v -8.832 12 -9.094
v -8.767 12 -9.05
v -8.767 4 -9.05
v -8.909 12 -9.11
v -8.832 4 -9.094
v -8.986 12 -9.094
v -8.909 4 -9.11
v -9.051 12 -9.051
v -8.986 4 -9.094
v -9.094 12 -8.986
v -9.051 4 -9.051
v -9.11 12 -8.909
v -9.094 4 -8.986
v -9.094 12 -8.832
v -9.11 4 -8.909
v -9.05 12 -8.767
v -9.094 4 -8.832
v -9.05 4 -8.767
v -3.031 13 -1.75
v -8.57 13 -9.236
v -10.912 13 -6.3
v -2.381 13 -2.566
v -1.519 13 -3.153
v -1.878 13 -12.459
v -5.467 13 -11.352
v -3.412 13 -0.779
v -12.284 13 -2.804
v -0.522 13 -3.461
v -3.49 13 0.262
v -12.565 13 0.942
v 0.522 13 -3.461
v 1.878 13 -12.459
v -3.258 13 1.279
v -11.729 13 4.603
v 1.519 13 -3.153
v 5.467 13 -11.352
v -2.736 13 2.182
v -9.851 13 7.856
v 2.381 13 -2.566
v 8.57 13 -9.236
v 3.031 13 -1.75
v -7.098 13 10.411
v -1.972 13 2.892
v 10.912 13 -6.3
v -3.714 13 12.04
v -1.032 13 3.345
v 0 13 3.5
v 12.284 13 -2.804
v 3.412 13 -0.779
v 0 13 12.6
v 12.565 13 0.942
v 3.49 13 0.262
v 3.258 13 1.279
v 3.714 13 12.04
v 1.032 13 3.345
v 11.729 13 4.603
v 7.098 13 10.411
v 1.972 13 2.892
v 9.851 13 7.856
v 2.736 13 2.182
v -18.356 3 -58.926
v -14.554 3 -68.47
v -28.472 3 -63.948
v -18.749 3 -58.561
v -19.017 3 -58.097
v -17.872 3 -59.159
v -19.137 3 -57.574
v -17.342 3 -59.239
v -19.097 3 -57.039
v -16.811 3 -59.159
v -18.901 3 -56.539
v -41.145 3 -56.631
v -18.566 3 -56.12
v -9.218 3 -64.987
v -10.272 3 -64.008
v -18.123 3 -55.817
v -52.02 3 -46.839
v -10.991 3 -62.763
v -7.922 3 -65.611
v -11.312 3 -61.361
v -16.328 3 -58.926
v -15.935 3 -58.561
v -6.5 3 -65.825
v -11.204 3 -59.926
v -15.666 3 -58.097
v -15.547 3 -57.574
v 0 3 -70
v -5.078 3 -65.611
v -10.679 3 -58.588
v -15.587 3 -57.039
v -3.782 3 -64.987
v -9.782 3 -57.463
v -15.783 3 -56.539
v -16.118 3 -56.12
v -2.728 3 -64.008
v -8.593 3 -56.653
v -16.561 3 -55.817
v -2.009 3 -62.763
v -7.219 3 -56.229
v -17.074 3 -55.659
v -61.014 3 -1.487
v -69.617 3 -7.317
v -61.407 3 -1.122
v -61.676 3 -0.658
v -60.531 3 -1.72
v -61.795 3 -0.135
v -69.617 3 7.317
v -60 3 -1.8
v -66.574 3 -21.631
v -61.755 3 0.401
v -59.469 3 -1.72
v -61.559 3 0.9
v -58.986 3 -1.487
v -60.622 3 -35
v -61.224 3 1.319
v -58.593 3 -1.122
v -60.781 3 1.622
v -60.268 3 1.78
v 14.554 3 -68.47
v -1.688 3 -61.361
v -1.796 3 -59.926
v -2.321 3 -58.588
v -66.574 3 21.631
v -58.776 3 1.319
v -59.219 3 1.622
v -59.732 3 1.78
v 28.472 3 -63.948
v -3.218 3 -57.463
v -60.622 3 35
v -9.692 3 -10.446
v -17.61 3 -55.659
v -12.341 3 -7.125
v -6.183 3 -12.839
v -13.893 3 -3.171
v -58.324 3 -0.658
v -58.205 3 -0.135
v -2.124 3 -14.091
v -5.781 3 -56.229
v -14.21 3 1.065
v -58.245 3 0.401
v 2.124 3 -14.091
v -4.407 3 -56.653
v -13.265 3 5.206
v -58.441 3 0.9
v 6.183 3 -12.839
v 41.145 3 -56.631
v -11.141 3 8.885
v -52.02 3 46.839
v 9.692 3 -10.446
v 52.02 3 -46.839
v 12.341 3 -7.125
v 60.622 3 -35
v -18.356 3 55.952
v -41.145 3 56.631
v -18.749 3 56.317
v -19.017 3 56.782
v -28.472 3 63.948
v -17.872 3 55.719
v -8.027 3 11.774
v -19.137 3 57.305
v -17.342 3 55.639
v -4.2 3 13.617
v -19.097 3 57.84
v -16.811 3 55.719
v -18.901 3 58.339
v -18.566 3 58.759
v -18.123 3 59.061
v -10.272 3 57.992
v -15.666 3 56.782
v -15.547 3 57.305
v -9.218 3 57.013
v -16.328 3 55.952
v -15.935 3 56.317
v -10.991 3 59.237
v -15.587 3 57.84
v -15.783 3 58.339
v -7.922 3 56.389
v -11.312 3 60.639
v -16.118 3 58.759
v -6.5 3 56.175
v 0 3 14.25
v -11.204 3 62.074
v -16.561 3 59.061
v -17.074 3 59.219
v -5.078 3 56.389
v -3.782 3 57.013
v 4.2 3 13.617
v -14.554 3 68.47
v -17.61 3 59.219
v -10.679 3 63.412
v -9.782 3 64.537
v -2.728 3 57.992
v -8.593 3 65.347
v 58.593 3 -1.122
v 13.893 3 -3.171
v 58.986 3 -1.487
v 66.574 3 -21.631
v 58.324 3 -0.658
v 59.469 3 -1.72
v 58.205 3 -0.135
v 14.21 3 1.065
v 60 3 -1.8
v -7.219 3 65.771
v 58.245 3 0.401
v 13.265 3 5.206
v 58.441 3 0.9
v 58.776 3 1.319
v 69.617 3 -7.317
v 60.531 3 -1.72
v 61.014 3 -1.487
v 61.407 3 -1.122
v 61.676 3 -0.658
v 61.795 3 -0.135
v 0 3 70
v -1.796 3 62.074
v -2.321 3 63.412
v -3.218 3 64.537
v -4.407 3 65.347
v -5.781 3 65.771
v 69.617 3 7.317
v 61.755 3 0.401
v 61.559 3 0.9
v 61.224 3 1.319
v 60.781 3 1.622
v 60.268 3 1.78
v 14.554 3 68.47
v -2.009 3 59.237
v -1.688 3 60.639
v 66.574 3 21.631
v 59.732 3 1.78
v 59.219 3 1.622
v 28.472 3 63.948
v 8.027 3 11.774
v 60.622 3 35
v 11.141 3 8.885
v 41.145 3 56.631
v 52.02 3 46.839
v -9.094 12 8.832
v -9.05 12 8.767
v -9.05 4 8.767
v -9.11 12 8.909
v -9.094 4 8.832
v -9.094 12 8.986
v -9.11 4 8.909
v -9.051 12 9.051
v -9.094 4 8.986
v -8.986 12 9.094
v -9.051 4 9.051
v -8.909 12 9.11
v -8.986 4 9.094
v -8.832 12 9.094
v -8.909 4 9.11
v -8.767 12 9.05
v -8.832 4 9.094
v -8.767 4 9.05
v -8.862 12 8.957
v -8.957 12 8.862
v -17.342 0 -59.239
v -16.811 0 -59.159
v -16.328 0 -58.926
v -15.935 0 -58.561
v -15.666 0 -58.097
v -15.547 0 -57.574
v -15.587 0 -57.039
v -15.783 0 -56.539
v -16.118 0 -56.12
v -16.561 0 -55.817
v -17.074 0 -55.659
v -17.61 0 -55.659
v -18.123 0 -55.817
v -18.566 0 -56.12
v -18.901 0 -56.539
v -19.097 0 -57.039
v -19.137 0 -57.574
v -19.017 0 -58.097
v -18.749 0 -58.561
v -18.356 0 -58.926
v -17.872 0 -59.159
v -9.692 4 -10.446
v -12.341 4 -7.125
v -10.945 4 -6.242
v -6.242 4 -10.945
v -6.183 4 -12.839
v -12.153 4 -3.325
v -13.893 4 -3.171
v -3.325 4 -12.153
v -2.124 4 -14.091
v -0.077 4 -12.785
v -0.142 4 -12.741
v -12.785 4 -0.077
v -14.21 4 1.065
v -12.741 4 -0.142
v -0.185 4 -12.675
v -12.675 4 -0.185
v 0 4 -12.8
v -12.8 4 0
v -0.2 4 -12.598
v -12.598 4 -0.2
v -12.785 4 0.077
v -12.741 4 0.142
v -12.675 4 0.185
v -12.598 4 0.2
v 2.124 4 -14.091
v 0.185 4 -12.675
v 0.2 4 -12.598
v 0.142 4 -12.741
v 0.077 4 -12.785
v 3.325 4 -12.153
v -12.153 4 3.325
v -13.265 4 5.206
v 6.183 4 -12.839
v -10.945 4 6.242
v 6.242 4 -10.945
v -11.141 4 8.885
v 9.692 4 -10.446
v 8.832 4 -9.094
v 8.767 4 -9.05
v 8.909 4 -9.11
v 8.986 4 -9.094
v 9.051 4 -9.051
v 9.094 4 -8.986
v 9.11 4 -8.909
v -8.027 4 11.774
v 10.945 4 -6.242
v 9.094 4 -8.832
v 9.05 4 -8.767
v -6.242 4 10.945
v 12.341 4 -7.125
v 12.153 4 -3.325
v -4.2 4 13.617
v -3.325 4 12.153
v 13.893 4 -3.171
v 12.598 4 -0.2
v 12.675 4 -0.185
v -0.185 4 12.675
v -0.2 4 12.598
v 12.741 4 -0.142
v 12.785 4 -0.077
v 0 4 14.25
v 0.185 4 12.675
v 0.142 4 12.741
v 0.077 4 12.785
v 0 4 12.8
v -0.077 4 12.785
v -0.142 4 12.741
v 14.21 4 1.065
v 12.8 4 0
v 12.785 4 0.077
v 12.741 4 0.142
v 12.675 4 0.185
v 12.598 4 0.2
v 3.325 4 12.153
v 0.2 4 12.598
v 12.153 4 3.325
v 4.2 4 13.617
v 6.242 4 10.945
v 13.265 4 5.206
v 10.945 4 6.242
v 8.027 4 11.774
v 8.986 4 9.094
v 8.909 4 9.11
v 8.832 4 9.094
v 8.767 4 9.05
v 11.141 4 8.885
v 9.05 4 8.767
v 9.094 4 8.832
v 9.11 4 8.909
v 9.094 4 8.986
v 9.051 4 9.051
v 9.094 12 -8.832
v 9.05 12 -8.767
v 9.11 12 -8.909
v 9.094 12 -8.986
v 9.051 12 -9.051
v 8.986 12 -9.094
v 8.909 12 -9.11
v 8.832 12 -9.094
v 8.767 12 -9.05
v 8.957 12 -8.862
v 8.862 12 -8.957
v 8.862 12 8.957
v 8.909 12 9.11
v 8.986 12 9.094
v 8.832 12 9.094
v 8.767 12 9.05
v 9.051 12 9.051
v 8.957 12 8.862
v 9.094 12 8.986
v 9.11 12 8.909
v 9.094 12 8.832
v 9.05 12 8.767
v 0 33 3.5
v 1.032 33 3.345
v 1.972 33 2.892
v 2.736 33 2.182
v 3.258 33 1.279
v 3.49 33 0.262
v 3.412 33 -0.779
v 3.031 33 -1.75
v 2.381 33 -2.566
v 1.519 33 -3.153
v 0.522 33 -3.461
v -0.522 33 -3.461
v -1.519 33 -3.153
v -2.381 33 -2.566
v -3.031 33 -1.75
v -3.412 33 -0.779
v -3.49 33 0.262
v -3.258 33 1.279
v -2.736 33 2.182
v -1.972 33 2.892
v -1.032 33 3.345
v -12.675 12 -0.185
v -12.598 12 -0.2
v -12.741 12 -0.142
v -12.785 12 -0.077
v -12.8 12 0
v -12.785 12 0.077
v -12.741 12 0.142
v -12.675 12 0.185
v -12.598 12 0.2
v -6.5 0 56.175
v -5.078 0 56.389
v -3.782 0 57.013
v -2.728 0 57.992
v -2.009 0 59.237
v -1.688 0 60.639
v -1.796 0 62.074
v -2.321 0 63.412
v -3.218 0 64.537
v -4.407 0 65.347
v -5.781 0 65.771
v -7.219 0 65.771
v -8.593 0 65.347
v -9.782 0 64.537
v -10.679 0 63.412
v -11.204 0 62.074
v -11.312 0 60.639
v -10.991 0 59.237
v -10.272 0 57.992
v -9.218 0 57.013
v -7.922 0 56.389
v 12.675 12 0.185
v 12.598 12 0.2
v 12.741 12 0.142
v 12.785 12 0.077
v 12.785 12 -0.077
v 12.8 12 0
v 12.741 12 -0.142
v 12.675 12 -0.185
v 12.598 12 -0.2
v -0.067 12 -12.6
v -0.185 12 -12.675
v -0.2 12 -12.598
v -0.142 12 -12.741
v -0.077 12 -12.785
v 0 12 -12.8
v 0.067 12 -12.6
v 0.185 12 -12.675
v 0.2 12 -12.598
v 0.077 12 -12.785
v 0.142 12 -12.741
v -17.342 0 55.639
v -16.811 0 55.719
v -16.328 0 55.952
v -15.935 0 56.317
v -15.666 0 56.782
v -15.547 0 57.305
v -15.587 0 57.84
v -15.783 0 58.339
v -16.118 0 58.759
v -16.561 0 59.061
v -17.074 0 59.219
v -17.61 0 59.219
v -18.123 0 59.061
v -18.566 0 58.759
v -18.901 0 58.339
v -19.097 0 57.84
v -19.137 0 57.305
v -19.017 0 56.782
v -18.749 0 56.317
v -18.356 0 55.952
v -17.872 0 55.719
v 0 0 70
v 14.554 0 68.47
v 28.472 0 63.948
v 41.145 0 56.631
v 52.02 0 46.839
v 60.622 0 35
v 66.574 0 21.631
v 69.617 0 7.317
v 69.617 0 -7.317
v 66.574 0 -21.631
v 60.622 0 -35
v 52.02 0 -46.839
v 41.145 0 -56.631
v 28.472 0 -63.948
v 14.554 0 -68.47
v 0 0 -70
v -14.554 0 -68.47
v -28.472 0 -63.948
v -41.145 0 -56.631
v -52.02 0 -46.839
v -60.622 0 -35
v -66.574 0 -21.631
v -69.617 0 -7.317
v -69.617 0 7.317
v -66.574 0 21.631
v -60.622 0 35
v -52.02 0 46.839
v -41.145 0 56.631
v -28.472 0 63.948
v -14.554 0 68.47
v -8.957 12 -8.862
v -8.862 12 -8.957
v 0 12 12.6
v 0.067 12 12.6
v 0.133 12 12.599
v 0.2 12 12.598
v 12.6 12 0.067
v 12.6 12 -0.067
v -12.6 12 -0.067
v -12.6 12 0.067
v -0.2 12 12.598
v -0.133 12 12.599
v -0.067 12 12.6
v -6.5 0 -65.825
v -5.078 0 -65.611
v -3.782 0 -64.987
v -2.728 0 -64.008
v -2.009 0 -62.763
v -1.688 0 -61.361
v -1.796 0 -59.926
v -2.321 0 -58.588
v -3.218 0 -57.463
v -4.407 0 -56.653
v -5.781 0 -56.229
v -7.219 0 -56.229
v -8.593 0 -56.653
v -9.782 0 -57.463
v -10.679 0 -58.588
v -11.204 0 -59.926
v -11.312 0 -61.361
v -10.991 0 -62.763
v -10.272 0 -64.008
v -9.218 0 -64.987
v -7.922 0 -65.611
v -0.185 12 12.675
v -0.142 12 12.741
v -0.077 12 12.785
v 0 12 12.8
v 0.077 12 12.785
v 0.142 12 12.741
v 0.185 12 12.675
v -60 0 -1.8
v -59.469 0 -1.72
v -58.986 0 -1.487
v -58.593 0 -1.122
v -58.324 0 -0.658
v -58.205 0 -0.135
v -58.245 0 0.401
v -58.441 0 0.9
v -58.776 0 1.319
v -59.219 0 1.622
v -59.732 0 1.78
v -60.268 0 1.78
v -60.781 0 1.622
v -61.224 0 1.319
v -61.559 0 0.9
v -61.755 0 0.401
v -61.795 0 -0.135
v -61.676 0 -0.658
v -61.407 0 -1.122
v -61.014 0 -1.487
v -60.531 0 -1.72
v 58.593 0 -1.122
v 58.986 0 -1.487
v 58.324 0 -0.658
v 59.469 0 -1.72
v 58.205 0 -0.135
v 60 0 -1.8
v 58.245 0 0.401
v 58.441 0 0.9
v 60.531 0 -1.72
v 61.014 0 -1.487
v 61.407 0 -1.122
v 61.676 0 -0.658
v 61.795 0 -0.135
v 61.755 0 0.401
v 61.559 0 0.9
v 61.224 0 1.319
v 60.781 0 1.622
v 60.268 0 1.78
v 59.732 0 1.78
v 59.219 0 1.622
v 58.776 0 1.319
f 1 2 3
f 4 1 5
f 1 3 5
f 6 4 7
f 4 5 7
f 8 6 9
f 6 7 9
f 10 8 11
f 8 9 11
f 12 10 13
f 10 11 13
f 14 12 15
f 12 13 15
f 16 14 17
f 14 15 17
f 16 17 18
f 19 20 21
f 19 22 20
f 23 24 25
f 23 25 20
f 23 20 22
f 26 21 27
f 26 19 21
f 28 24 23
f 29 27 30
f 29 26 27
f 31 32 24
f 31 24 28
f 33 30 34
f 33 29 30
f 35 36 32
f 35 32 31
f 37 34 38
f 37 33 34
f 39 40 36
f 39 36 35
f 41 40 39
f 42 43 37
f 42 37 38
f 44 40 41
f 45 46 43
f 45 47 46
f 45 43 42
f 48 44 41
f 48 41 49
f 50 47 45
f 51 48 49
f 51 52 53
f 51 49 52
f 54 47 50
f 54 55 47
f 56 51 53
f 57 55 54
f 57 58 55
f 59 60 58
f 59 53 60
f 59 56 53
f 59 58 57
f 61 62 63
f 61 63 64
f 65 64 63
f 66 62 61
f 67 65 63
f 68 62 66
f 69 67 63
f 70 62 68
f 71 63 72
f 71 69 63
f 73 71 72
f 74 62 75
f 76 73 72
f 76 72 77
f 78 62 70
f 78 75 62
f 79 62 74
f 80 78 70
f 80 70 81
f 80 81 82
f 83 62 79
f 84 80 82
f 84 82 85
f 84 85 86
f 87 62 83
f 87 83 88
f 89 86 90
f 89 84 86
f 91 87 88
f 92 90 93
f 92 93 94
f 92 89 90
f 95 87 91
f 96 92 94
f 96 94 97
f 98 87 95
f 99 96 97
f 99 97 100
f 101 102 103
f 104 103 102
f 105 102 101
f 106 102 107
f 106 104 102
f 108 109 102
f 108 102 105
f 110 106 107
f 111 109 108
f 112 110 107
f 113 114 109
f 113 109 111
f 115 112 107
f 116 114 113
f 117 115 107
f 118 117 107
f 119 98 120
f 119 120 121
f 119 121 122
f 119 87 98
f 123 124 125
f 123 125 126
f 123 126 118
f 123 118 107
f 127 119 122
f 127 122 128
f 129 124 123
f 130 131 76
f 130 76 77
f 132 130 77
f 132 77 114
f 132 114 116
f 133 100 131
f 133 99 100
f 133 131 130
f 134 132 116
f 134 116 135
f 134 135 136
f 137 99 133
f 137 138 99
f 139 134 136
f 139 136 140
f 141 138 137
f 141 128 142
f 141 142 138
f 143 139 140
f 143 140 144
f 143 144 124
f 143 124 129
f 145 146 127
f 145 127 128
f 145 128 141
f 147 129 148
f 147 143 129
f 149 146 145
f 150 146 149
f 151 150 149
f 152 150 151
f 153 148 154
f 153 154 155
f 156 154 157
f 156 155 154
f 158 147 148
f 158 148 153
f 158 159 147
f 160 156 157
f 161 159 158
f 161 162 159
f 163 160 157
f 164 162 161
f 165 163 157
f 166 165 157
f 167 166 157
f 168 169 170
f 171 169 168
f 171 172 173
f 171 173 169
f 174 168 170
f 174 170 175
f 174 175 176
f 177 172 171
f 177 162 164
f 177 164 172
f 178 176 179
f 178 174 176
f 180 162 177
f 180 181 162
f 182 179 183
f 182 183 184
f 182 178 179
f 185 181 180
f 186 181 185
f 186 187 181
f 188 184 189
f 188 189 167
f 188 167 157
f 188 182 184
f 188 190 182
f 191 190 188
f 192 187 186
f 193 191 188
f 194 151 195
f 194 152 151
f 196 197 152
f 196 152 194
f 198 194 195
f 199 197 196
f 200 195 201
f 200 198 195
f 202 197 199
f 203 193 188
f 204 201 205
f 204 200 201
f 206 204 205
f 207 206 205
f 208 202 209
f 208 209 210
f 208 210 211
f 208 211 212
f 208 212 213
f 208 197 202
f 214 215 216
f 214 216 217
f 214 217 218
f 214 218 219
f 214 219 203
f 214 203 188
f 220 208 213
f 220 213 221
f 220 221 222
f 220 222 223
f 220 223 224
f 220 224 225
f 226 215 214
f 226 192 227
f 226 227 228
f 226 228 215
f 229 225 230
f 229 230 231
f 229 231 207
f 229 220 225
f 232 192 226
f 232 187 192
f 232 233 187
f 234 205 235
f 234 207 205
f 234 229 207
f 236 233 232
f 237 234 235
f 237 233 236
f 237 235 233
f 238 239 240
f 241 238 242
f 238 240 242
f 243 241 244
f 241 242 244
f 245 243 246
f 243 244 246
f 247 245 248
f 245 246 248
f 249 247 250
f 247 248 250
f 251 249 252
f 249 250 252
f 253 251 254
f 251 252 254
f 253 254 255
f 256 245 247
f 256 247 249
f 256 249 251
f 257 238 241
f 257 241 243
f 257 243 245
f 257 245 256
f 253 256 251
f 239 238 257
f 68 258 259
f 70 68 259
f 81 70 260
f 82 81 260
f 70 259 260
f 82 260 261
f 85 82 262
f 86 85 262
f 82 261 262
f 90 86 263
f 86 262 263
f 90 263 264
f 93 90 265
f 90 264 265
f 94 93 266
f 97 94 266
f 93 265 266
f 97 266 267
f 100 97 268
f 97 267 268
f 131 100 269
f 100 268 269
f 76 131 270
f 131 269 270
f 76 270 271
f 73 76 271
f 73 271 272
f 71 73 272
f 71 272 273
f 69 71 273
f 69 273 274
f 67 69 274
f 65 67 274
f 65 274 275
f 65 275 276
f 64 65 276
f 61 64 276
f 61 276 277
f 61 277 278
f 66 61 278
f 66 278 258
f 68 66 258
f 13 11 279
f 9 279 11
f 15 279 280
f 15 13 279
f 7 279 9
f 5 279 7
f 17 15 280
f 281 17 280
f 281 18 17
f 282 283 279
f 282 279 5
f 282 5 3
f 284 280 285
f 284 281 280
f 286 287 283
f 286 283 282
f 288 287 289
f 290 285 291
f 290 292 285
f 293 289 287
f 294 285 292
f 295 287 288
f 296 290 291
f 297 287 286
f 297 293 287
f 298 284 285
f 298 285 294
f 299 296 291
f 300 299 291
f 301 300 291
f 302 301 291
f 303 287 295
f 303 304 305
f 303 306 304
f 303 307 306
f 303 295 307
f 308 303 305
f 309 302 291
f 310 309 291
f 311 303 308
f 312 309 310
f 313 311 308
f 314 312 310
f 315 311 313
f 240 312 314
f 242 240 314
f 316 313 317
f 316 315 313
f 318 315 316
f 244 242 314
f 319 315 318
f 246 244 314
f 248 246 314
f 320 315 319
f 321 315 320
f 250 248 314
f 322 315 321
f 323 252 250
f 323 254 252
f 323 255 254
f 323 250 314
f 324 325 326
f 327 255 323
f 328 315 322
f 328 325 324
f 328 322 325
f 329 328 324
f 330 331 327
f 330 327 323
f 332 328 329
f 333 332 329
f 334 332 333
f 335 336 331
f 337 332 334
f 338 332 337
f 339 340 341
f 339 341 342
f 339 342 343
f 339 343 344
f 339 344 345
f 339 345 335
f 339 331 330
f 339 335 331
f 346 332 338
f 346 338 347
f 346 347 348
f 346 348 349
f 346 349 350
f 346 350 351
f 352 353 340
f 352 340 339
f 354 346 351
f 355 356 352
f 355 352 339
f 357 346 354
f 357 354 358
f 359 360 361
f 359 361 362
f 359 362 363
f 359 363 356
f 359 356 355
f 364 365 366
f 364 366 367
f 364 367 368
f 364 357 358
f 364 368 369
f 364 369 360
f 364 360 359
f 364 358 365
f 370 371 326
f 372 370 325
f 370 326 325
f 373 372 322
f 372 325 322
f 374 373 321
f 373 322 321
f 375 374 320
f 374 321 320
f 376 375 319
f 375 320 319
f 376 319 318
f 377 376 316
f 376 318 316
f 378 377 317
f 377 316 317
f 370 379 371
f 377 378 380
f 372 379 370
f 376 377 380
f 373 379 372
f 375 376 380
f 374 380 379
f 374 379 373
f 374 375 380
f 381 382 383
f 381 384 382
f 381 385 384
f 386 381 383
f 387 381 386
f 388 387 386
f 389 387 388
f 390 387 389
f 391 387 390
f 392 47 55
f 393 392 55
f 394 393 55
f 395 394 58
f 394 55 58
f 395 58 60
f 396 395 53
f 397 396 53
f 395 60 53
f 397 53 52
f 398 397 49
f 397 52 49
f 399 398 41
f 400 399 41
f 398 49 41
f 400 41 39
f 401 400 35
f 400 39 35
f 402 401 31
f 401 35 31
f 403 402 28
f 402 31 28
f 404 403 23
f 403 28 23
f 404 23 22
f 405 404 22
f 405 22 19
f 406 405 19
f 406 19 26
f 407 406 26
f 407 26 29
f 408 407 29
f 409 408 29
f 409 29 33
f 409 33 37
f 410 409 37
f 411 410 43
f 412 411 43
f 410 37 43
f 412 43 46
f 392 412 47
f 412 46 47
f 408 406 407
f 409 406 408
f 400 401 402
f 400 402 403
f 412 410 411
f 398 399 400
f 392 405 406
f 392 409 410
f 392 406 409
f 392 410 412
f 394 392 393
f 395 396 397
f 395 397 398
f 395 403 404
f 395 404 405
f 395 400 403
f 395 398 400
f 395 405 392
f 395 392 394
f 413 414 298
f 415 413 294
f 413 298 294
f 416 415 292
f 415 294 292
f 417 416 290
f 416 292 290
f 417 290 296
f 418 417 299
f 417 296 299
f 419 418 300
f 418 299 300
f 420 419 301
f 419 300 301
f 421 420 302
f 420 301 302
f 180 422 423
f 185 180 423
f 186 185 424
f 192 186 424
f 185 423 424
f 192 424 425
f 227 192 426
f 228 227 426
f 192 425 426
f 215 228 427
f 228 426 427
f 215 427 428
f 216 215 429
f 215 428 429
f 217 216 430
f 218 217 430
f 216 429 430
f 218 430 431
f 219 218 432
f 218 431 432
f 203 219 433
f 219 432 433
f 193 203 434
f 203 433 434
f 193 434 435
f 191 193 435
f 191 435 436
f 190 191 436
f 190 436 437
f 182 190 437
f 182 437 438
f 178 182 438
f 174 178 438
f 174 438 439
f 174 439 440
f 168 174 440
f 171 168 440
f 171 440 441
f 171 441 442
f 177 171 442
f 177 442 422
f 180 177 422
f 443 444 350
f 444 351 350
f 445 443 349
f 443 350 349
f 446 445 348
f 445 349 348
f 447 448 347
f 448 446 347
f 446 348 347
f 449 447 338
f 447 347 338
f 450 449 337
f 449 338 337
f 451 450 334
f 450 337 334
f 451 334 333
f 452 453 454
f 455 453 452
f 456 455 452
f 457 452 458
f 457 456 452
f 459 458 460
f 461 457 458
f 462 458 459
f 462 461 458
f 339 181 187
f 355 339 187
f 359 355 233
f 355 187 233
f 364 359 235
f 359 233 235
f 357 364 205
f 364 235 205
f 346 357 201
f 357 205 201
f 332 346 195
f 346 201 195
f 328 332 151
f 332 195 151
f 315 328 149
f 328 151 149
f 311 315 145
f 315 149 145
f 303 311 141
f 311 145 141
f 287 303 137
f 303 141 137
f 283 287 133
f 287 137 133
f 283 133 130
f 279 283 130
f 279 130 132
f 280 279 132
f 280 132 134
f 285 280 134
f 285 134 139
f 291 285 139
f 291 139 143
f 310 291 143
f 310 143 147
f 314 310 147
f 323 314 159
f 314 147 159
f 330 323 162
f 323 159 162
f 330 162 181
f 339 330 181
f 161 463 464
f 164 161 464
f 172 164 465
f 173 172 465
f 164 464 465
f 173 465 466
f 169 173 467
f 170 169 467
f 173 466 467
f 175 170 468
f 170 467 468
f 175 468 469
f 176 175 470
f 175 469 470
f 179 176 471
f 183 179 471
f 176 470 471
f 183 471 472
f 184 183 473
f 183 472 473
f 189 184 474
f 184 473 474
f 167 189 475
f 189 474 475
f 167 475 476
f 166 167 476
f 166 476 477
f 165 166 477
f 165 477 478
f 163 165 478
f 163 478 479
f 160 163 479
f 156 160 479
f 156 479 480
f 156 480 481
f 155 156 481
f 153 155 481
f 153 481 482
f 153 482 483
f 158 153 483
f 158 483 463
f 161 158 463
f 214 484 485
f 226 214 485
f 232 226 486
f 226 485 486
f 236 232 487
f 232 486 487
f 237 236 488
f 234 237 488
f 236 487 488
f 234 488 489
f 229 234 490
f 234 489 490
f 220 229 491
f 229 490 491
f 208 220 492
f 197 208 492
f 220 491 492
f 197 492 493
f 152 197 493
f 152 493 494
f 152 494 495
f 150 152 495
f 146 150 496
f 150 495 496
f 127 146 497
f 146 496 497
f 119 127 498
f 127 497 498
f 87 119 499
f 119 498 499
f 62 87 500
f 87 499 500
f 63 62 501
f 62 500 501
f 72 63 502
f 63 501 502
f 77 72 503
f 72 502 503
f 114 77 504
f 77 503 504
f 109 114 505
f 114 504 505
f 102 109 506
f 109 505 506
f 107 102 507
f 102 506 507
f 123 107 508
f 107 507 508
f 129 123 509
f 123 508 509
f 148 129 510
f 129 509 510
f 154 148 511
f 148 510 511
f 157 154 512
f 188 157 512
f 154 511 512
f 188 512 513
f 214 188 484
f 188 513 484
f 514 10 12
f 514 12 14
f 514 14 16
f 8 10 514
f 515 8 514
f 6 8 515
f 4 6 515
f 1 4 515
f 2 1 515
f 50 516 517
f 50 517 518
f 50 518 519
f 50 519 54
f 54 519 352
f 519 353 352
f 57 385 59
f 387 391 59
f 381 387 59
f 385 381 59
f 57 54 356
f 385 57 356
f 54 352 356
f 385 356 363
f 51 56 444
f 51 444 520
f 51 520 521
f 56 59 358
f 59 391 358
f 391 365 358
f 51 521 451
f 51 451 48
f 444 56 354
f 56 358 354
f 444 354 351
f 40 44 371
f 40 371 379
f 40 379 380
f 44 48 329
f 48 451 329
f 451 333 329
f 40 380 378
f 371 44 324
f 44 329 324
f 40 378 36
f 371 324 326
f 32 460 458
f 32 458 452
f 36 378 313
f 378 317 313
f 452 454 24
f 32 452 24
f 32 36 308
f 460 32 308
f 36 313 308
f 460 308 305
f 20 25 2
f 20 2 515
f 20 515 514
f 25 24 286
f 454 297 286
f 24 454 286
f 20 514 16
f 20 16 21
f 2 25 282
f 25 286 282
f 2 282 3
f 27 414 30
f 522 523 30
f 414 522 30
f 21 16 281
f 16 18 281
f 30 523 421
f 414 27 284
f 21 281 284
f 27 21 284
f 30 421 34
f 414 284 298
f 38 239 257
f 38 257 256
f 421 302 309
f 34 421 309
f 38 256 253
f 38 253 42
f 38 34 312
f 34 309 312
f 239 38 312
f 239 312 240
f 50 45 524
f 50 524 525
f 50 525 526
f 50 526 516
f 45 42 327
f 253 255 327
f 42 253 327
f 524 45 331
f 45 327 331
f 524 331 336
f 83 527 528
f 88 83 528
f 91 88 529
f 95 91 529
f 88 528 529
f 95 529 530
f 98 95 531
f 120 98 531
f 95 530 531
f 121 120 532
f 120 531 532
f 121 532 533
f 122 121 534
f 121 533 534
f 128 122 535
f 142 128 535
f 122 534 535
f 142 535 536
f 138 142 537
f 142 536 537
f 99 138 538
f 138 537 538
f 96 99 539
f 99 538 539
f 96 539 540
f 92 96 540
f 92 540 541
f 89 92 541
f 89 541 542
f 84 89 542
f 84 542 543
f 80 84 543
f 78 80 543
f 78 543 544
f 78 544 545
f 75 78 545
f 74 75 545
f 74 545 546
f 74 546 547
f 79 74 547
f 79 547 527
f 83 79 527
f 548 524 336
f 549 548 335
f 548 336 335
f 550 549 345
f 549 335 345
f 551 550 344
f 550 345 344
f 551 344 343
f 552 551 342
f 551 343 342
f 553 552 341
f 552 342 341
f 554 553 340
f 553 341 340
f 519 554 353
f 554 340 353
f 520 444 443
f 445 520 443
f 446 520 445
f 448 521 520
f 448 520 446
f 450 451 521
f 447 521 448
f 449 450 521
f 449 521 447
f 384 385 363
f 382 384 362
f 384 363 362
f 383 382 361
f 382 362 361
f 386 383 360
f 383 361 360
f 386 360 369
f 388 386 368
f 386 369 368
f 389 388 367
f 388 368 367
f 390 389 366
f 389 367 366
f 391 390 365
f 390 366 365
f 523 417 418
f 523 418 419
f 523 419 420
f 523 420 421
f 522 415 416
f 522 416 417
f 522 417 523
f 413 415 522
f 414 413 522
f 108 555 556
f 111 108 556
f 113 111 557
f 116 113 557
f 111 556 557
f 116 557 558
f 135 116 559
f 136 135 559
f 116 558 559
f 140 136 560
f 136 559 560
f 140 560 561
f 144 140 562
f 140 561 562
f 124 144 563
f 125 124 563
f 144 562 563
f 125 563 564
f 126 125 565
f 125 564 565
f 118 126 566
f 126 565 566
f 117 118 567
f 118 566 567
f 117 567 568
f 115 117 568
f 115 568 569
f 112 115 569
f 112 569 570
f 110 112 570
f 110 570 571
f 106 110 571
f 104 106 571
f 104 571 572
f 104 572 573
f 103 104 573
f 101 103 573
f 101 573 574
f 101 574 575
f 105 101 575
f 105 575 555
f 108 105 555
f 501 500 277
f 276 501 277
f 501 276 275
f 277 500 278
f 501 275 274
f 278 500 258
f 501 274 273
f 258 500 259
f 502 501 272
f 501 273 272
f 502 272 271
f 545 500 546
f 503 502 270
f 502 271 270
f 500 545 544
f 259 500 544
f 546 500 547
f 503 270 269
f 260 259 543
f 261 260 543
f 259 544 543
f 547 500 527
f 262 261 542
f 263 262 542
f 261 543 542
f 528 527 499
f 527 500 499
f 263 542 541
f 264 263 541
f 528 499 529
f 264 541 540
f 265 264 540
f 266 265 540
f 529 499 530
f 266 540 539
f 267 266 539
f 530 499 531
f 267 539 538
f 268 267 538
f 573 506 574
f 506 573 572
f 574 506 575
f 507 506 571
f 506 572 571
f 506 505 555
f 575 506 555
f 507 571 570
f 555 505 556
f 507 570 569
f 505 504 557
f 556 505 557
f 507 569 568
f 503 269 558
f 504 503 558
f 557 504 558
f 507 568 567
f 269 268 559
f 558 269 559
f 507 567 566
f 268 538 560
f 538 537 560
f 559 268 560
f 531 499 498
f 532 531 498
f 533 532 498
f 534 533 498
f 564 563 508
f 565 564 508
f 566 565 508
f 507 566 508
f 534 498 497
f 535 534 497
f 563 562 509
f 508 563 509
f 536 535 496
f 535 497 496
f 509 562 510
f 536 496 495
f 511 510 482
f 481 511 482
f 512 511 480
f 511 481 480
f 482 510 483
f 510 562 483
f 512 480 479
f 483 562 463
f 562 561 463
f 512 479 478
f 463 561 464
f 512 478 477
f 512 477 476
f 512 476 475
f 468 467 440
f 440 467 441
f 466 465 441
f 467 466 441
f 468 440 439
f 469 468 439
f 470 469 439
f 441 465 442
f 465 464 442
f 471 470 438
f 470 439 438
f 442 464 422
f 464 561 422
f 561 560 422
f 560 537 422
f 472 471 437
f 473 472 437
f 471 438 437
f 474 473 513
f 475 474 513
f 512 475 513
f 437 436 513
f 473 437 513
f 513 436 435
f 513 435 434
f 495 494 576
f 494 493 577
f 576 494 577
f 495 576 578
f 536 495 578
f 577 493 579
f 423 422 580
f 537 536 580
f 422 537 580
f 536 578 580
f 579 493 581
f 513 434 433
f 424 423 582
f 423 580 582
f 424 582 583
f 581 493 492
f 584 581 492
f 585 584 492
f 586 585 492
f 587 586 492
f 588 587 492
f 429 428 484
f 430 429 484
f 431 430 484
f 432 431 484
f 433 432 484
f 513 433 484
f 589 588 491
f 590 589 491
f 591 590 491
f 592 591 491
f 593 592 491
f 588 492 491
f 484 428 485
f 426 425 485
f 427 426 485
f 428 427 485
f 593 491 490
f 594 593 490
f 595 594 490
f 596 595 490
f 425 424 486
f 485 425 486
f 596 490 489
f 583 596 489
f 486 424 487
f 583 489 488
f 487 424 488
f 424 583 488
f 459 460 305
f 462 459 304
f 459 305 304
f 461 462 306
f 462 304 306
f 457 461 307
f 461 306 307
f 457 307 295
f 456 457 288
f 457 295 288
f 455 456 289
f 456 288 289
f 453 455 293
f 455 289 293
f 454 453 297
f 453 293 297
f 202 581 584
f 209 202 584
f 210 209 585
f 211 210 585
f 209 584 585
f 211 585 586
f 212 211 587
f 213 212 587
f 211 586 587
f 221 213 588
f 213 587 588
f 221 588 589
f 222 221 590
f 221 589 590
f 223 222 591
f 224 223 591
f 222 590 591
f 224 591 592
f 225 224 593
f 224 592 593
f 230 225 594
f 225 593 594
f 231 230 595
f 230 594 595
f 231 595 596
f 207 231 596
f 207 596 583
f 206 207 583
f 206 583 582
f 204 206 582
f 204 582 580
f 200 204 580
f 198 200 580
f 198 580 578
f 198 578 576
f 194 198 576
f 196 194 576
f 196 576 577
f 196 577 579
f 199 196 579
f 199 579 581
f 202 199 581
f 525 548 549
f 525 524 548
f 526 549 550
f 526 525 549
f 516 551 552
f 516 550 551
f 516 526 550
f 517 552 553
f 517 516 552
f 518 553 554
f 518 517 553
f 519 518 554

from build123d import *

# Parameters (mm, degrees)
SKETCH1_R                      = 70
BASE_PLATE_DEPTH               = 3
SKETCH2_R                      = 14.25
BEARING_STEPUP_DEPTH           = 1
SKETCH3_R                      = 12.6
BEARING_SITTING_DEPTH          = 9
SKETCH4_R                      = 0.2
BEARING_SITTING_GRID_DEPTH     = 8
SKETCH5_R                      = 1.8
M3_SCREW_CLEARANCE_HOLES_DEPTH = 100.844879688
SKETCH6_R                      = 4.825
HOLES_RESERVED_FOR_RODS_DEPTH  = 100.844879688
SKETCH7_R                      = 3.5
BOSS_EXTRUDE5_DEPTH            = 20


with BuildPart() as part:
    # Sketch1 → base-plate (new body)
    with BuildSketch(Plane(origin=(0, 0, 0), x_dir=(1, 0, 0), z_dir=(0, 1, 0))):
        with Locations(Location((0, 0, 0), (0, 0, 270))):
            Circle(SKETCH1_R)
    extrude(amount=BASE_PLATE_DEPTH)

    # Sketch2 → bearing-stepup (add)
    with BuildSketch(Plane(origin=(0, 3, 0), x_dir=(1, 0, 0), z_dir=(0, 1, 0))):
        with Locations(Location((0, 0, 0), (0, 0, 270))):
            Circle(SKETCH2_R)
    extrude(amount=BEARING_STEPUP_DEPTH)

    # Sketch3 → bearing-sitting (add)
    with BuildSketch(Plane(origin=(0, 4, 0), x_dir=(1, 0, 0), z_dir=(0, 1, 0))):
        with Locations(Location((0, 0, 0), (0, 0, 270))):
            Circle(SKETCH3_R)
    extrude(amount=BEARING_SITTING_DEPTH)

    # Sketch4 → bearing-sitting-grid (add)
    with BuildSketch(Plane(origin=(0, 4, 0), x_dir=(1, 0, 0), z_dir=(0, 1, 0))):
        with Locations((0, 12.6)):
            Circle(SKETCH4_R)
        with Locations((8.909545443, 8.909545443)):
            Circle(SKETCH4_R)
        with Locations((12.6, 0)):
            Circle(SKETCH4_R)
        with Locations((8.909545443, -8.909545443)):
            Circle(SKETCH4_R)
        with Locations((0, -12.6)):
            Circle(SKETCH4_R)
        with Locations((-8.909545443, -8.909545443)):
            Circle(SKETCH4_R)
        with Locations((-12.6, 0)):
            Circle(SKETCH4_R)
        with Locations((-8.909545443, 8.909545443)):
            Circle(SKETCH4_R)
    extrude(amount=BEARING_SITTING_GRID_DEPTH)

    # Sketch5 → m3-screw-clearance-holes (cut, through all)
    with BuildSketch(Plane.XZ):
        with Locations(Location((-17.341907817, 57.439169852, 0), (0, 0, 270))):
            Circle(SKETCH5_R)
        with Locations(Location((-60, 0, 0), (0, 0, 270))):
            Circle(SKETCH5_R)
        with Locations(Location((-17.341907817, -57.439169852, 0), (0, 0, 270))):
            Circle(SKETCH5_R)
        with Locations(Location((60, 0, 0), (0, 0, 270))):
            Circle(SKETCH5_R)
    extrude(amount=-M3_SCREW_CLEARANCE_HOLES_DEPTH, mode=Mode.SUBTRACT)

    # Sketch6 → holes-reserved-for-rods (cut, through all)
    with BuildSketch(Plane.XZ):
        with Locations(Location((-6.5, 61, 0), (0, 0, 270))):
            Circle(SKETCH6_R)
        with Locations(Location((-6.5, -61, 0), (0, 0, 270))):
            Circle(SKETCH6_R)
    extrude(amount=-HOLES_RESERVED_FOR_RODS_DEPTH, mode=Mode.SUBTRACT)

    # Sketch7 → Boss-Extrude5 (add)
    with BuildSketch(Plane(origin=(0, 13, 0), x_dir=(1, 0, 0), z_dir=(0, 1, 0))):
        with Locations(Location((0, 0, 0), (0, 0, 270))):
            Circle(SKETCH7_R)
    extrude(amount=BOSS_EXTRUDE5_DEPTH)


solid = part.part
